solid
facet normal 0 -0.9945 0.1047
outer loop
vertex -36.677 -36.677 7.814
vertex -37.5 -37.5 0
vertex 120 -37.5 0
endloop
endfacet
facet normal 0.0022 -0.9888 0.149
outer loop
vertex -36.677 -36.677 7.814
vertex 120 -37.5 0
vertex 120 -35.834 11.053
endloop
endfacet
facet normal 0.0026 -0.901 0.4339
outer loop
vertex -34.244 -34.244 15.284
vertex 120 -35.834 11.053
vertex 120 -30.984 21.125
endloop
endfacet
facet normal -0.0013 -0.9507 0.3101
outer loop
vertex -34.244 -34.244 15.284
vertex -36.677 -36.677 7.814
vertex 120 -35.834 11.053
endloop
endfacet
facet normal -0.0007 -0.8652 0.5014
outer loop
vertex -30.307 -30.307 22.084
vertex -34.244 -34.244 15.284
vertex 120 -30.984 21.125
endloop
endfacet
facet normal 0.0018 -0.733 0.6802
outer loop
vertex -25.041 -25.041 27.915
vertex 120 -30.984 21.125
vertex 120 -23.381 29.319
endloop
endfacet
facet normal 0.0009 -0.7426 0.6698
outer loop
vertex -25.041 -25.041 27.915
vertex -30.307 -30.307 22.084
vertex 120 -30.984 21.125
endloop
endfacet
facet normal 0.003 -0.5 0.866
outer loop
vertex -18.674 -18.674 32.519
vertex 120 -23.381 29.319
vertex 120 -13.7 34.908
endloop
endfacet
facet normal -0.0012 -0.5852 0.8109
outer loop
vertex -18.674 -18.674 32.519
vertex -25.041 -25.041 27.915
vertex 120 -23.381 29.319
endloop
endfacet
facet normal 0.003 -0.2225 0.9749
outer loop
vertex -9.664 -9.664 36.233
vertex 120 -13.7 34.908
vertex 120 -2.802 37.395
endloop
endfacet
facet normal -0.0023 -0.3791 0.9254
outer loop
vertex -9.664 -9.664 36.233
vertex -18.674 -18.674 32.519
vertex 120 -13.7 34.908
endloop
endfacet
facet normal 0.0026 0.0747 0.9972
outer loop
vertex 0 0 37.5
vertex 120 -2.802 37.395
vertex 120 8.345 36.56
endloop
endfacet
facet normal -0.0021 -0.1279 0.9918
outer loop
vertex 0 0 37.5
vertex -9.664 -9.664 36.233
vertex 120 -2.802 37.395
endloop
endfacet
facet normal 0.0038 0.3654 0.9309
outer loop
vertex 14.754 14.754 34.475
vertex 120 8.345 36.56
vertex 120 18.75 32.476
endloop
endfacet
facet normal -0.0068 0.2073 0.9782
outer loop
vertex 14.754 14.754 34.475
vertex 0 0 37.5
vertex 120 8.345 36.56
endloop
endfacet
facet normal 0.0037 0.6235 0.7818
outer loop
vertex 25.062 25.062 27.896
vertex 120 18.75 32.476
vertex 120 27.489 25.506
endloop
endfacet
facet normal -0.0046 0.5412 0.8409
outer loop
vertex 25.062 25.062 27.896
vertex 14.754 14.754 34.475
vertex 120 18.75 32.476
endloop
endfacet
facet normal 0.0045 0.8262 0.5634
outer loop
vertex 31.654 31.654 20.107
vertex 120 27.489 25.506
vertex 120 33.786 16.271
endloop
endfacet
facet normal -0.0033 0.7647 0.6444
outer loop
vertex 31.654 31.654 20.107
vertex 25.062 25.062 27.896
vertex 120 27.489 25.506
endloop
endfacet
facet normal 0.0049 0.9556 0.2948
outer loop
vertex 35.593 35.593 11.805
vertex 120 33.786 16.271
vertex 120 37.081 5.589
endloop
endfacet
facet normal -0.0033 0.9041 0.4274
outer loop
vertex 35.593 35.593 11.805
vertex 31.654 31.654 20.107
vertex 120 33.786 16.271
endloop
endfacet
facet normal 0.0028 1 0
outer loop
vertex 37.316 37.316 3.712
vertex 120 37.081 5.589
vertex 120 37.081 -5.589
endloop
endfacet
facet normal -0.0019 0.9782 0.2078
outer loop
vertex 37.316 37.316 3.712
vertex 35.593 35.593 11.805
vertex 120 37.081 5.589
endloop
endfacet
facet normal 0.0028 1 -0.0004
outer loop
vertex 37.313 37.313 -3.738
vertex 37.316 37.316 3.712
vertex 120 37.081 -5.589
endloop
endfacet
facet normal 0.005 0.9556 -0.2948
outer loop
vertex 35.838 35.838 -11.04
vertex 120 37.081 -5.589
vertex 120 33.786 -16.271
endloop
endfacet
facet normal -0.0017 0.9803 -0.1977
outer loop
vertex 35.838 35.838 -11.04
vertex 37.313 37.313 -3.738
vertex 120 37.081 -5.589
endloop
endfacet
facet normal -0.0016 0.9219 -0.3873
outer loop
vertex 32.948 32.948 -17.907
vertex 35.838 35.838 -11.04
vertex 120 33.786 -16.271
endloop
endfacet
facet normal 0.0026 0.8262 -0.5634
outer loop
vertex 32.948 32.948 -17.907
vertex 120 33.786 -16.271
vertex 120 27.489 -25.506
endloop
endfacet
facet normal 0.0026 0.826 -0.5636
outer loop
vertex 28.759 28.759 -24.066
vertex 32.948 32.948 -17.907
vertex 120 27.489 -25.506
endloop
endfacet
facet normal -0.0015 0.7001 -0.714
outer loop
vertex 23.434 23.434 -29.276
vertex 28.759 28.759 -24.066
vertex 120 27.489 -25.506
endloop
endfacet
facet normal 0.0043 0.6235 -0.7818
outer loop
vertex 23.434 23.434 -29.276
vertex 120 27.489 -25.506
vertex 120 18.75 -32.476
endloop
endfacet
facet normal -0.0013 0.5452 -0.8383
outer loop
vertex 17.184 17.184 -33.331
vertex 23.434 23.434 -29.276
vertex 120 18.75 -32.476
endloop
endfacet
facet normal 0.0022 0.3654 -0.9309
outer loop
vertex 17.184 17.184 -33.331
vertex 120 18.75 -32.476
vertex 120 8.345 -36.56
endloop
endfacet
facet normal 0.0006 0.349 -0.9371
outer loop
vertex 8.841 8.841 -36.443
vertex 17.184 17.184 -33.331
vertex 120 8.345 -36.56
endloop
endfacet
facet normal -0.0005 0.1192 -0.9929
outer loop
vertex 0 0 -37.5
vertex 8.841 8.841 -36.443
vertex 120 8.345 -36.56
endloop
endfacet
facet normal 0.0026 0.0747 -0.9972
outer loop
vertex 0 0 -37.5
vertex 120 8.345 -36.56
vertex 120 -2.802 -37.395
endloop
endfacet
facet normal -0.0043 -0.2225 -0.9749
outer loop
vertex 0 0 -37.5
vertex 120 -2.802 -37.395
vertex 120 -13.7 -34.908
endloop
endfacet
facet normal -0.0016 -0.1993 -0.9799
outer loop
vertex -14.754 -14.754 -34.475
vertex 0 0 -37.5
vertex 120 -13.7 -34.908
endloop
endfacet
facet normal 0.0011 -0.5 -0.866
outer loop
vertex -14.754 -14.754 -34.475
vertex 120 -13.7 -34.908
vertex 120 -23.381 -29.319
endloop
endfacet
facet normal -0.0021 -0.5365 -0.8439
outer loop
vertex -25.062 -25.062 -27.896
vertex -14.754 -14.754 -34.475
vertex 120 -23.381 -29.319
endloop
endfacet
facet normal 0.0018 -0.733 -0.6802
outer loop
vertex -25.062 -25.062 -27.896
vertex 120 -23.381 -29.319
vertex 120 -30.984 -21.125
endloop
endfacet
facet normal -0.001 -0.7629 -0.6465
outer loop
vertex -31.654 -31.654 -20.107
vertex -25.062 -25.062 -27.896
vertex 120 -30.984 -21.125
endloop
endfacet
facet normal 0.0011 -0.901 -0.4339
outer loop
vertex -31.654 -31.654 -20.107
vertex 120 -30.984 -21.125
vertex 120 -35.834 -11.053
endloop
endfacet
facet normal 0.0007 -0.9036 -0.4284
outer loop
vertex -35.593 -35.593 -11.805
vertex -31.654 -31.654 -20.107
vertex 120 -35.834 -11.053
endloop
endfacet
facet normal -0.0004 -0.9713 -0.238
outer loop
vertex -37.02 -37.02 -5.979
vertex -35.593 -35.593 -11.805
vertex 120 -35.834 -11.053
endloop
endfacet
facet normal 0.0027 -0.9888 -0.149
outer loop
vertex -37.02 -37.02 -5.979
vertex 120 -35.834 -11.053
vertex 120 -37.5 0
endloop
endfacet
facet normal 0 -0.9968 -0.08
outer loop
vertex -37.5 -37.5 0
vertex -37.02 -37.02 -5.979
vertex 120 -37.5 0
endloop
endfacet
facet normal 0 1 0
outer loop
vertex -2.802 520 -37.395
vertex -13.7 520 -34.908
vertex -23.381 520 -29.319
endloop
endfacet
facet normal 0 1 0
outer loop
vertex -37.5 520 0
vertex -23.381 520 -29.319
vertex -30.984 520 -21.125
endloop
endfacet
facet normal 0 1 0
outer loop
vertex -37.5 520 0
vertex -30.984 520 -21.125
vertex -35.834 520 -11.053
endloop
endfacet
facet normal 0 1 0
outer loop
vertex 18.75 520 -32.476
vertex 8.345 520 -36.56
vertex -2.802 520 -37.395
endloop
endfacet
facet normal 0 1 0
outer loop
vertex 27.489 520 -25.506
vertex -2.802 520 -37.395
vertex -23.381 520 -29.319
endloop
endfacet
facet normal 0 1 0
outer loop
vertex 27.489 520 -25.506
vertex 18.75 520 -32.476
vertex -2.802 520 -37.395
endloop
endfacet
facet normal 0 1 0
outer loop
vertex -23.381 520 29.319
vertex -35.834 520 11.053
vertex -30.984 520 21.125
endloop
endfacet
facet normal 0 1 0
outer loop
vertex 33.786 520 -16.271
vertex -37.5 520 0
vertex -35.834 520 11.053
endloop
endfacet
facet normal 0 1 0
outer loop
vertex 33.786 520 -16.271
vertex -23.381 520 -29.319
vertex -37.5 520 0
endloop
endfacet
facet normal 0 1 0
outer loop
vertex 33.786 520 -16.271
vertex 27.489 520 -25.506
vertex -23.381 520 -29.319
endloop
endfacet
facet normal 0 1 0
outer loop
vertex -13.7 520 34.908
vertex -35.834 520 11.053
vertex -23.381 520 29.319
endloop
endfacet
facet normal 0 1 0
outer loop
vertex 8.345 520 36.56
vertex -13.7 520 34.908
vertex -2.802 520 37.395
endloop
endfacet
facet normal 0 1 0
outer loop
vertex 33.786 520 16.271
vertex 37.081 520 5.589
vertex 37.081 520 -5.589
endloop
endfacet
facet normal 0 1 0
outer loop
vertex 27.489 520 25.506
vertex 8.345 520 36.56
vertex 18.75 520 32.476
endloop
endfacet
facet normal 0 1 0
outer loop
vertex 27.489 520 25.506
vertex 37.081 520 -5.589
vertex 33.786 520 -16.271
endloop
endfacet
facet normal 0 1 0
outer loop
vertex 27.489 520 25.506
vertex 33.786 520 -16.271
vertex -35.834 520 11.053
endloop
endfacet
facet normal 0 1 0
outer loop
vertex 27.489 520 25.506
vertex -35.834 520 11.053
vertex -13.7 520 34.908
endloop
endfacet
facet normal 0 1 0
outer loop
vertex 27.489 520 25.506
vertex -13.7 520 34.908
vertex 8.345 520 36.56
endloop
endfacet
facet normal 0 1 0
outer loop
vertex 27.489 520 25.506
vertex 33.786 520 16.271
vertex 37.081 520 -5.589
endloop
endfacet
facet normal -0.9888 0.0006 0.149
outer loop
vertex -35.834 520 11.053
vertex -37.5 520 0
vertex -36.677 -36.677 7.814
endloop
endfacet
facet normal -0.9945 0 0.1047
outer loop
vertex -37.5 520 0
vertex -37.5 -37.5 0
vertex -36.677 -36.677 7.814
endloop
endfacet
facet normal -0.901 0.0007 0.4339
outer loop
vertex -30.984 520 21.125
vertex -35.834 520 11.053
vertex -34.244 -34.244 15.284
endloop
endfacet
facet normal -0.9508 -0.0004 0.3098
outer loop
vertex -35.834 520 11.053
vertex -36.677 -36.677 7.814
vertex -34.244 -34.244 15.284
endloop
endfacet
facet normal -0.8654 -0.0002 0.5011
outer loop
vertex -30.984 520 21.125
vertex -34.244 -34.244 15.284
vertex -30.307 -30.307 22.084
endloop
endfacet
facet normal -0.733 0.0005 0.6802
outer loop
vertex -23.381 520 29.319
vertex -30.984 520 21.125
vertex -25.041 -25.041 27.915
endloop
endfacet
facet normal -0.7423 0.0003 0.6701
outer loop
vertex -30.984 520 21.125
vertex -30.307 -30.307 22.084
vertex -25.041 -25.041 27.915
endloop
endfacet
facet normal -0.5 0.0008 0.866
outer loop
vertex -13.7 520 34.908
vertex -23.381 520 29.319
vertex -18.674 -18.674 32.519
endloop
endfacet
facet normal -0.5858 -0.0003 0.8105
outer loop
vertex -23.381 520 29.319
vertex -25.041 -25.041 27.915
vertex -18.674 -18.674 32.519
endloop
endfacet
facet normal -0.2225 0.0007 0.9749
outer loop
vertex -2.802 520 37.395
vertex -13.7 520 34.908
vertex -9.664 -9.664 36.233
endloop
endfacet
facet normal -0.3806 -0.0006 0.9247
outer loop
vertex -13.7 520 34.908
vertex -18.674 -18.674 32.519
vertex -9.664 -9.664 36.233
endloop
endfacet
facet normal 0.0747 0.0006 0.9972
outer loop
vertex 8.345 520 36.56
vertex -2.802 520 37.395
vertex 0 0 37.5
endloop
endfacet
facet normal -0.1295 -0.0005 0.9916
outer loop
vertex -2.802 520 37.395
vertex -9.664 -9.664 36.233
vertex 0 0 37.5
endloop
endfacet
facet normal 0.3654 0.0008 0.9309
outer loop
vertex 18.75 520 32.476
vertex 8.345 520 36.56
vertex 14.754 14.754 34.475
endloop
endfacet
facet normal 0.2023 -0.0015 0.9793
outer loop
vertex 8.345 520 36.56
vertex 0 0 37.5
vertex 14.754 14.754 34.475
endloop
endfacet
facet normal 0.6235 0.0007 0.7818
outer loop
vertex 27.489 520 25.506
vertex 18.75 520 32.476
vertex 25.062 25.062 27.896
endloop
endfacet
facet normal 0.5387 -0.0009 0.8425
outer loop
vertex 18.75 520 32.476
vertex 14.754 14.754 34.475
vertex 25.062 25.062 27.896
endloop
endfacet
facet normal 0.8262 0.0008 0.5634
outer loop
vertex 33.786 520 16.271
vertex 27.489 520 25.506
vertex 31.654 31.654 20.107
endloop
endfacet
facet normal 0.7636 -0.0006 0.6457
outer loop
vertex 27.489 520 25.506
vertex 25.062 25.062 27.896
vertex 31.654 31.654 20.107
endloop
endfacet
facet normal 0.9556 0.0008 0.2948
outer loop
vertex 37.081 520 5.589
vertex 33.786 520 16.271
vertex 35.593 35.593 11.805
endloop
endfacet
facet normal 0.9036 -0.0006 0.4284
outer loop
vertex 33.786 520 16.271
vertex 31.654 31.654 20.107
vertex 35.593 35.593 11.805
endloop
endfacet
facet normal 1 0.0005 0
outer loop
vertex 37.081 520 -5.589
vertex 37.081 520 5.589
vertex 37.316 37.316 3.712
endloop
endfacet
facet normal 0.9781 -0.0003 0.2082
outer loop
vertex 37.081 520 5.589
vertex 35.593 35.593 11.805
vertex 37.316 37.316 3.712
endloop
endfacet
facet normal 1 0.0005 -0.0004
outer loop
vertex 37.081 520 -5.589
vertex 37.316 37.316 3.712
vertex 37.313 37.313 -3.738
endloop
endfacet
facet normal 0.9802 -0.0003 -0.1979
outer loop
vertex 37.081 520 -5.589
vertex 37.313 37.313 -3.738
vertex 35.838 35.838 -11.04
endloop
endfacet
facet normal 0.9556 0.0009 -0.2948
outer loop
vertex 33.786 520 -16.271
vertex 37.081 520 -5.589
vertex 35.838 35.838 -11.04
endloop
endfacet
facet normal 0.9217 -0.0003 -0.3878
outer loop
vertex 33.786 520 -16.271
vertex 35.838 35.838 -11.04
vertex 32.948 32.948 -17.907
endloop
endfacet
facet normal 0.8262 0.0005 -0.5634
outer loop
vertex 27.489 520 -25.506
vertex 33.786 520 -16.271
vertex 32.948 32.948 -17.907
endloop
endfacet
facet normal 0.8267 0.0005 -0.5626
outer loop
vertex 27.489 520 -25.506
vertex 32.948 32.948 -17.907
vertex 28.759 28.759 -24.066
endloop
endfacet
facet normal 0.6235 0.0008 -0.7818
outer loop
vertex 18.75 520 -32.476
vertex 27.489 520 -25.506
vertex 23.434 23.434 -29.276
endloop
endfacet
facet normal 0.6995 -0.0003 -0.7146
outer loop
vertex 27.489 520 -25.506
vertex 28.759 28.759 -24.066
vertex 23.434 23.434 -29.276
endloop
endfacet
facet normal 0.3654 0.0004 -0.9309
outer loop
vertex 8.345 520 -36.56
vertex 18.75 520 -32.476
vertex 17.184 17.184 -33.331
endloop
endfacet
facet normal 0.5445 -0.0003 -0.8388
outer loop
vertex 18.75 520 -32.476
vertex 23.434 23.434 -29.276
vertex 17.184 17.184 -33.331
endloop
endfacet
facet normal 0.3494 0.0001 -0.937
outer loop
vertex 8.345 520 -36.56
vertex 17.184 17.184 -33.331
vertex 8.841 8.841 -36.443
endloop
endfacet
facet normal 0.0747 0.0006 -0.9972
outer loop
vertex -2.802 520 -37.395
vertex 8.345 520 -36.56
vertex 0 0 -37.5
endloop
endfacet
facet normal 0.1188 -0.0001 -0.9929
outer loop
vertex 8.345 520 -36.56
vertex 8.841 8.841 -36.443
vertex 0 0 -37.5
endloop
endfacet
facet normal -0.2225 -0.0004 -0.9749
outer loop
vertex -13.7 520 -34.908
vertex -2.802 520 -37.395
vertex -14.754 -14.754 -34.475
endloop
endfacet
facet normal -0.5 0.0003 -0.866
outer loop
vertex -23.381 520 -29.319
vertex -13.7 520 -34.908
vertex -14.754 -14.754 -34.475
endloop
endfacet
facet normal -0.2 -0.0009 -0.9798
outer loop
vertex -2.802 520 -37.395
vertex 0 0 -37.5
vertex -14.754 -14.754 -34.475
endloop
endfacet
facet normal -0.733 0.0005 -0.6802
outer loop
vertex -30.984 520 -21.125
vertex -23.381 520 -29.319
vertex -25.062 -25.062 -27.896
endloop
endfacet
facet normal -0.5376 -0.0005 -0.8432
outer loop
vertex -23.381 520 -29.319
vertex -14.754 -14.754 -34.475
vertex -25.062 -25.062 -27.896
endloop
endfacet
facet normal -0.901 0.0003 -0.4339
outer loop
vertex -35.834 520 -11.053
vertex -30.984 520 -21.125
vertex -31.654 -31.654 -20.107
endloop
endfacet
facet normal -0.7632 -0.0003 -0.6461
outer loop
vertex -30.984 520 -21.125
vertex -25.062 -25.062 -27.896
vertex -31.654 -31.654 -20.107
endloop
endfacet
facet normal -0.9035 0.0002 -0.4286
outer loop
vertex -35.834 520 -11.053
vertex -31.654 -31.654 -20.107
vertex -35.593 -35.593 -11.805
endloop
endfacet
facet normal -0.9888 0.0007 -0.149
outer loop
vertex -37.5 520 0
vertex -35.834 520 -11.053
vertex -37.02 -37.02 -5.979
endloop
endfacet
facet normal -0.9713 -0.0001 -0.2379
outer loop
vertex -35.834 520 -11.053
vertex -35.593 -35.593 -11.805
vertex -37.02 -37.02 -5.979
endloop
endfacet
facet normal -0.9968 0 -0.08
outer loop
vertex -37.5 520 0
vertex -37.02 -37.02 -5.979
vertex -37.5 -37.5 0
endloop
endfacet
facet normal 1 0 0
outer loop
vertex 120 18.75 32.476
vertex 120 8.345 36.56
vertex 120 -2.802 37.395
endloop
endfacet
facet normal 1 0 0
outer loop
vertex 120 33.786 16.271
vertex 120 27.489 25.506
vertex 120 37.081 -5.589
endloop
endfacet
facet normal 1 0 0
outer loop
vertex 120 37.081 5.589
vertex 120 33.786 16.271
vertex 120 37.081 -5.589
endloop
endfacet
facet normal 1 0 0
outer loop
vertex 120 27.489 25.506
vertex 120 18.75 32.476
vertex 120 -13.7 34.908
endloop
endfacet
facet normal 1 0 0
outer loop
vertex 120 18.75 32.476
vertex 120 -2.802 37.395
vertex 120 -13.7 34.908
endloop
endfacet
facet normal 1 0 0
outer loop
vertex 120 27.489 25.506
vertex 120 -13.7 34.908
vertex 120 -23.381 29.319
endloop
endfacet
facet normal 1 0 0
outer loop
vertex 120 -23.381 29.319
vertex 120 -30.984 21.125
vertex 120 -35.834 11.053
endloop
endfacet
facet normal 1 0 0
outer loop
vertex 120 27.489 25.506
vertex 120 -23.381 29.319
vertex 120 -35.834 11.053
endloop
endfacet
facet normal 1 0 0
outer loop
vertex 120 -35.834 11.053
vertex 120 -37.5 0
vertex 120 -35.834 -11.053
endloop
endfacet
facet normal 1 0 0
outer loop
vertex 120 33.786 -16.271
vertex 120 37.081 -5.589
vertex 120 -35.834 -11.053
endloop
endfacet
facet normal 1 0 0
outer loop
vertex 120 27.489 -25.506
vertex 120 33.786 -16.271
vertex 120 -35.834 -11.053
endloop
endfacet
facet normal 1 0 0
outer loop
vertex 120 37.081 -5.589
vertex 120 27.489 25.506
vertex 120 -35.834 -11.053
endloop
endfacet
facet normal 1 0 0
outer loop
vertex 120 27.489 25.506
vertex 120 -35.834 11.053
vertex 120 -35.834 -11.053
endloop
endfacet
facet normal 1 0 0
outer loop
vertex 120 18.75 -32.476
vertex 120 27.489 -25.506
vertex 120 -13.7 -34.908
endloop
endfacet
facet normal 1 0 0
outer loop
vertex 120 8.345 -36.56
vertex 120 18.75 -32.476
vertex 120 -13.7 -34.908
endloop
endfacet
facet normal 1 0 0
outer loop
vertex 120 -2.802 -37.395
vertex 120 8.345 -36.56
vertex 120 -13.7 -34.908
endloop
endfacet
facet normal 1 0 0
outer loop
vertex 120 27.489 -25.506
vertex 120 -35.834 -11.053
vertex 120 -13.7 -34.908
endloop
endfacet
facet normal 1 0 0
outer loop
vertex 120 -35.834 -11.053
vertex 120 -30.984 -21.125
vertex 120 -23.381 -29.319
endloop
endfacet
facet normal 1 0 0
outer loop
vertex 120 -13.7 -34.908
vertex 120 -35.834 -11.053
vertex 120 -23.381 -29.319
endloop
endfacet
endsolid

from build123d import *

# Parameters (mm, degrees)
SWEEP2_PROFILE_R = 37.5
MOVE_FACE1_BY    = 100
MOVE_FACE2_BY    = 120


with BuildPart() as part:
    # Sweep2: sweep along a path in Sketch1
    with BuildLine(Plane.XY) as sweep2_path:
        Line((120, 0), (0, 0))
        Line((0, 0), (0, 300))
    # Sweep2 profile (on start of the path) → Sweep2 (sweep)
    with BuildSketch(Plane(origin=(120, 0, 0), x_dir=(0, -1, 0), z_dir=(-1, 0, 0))):
        Circle(SWEEP2_PROFILE_R)
    sweep(path=sweep2_path.line, transition=Transition.RIGHT)

    # Move Face1: a face moved outward by 100.0
    extrude(part.faces().sort_by_distance((0, 300, 0))[0], amount=MOVE_FACE1_BY, dir=(0, 1, 0))

    # Move Face2: a face moved outward by 120.0
    extrude(part.faces().sort_by_distance((0, 400, 0))[0], amount=MOVE_FACE2_BY, dir=(0, 1, 0))


solid = part.part
